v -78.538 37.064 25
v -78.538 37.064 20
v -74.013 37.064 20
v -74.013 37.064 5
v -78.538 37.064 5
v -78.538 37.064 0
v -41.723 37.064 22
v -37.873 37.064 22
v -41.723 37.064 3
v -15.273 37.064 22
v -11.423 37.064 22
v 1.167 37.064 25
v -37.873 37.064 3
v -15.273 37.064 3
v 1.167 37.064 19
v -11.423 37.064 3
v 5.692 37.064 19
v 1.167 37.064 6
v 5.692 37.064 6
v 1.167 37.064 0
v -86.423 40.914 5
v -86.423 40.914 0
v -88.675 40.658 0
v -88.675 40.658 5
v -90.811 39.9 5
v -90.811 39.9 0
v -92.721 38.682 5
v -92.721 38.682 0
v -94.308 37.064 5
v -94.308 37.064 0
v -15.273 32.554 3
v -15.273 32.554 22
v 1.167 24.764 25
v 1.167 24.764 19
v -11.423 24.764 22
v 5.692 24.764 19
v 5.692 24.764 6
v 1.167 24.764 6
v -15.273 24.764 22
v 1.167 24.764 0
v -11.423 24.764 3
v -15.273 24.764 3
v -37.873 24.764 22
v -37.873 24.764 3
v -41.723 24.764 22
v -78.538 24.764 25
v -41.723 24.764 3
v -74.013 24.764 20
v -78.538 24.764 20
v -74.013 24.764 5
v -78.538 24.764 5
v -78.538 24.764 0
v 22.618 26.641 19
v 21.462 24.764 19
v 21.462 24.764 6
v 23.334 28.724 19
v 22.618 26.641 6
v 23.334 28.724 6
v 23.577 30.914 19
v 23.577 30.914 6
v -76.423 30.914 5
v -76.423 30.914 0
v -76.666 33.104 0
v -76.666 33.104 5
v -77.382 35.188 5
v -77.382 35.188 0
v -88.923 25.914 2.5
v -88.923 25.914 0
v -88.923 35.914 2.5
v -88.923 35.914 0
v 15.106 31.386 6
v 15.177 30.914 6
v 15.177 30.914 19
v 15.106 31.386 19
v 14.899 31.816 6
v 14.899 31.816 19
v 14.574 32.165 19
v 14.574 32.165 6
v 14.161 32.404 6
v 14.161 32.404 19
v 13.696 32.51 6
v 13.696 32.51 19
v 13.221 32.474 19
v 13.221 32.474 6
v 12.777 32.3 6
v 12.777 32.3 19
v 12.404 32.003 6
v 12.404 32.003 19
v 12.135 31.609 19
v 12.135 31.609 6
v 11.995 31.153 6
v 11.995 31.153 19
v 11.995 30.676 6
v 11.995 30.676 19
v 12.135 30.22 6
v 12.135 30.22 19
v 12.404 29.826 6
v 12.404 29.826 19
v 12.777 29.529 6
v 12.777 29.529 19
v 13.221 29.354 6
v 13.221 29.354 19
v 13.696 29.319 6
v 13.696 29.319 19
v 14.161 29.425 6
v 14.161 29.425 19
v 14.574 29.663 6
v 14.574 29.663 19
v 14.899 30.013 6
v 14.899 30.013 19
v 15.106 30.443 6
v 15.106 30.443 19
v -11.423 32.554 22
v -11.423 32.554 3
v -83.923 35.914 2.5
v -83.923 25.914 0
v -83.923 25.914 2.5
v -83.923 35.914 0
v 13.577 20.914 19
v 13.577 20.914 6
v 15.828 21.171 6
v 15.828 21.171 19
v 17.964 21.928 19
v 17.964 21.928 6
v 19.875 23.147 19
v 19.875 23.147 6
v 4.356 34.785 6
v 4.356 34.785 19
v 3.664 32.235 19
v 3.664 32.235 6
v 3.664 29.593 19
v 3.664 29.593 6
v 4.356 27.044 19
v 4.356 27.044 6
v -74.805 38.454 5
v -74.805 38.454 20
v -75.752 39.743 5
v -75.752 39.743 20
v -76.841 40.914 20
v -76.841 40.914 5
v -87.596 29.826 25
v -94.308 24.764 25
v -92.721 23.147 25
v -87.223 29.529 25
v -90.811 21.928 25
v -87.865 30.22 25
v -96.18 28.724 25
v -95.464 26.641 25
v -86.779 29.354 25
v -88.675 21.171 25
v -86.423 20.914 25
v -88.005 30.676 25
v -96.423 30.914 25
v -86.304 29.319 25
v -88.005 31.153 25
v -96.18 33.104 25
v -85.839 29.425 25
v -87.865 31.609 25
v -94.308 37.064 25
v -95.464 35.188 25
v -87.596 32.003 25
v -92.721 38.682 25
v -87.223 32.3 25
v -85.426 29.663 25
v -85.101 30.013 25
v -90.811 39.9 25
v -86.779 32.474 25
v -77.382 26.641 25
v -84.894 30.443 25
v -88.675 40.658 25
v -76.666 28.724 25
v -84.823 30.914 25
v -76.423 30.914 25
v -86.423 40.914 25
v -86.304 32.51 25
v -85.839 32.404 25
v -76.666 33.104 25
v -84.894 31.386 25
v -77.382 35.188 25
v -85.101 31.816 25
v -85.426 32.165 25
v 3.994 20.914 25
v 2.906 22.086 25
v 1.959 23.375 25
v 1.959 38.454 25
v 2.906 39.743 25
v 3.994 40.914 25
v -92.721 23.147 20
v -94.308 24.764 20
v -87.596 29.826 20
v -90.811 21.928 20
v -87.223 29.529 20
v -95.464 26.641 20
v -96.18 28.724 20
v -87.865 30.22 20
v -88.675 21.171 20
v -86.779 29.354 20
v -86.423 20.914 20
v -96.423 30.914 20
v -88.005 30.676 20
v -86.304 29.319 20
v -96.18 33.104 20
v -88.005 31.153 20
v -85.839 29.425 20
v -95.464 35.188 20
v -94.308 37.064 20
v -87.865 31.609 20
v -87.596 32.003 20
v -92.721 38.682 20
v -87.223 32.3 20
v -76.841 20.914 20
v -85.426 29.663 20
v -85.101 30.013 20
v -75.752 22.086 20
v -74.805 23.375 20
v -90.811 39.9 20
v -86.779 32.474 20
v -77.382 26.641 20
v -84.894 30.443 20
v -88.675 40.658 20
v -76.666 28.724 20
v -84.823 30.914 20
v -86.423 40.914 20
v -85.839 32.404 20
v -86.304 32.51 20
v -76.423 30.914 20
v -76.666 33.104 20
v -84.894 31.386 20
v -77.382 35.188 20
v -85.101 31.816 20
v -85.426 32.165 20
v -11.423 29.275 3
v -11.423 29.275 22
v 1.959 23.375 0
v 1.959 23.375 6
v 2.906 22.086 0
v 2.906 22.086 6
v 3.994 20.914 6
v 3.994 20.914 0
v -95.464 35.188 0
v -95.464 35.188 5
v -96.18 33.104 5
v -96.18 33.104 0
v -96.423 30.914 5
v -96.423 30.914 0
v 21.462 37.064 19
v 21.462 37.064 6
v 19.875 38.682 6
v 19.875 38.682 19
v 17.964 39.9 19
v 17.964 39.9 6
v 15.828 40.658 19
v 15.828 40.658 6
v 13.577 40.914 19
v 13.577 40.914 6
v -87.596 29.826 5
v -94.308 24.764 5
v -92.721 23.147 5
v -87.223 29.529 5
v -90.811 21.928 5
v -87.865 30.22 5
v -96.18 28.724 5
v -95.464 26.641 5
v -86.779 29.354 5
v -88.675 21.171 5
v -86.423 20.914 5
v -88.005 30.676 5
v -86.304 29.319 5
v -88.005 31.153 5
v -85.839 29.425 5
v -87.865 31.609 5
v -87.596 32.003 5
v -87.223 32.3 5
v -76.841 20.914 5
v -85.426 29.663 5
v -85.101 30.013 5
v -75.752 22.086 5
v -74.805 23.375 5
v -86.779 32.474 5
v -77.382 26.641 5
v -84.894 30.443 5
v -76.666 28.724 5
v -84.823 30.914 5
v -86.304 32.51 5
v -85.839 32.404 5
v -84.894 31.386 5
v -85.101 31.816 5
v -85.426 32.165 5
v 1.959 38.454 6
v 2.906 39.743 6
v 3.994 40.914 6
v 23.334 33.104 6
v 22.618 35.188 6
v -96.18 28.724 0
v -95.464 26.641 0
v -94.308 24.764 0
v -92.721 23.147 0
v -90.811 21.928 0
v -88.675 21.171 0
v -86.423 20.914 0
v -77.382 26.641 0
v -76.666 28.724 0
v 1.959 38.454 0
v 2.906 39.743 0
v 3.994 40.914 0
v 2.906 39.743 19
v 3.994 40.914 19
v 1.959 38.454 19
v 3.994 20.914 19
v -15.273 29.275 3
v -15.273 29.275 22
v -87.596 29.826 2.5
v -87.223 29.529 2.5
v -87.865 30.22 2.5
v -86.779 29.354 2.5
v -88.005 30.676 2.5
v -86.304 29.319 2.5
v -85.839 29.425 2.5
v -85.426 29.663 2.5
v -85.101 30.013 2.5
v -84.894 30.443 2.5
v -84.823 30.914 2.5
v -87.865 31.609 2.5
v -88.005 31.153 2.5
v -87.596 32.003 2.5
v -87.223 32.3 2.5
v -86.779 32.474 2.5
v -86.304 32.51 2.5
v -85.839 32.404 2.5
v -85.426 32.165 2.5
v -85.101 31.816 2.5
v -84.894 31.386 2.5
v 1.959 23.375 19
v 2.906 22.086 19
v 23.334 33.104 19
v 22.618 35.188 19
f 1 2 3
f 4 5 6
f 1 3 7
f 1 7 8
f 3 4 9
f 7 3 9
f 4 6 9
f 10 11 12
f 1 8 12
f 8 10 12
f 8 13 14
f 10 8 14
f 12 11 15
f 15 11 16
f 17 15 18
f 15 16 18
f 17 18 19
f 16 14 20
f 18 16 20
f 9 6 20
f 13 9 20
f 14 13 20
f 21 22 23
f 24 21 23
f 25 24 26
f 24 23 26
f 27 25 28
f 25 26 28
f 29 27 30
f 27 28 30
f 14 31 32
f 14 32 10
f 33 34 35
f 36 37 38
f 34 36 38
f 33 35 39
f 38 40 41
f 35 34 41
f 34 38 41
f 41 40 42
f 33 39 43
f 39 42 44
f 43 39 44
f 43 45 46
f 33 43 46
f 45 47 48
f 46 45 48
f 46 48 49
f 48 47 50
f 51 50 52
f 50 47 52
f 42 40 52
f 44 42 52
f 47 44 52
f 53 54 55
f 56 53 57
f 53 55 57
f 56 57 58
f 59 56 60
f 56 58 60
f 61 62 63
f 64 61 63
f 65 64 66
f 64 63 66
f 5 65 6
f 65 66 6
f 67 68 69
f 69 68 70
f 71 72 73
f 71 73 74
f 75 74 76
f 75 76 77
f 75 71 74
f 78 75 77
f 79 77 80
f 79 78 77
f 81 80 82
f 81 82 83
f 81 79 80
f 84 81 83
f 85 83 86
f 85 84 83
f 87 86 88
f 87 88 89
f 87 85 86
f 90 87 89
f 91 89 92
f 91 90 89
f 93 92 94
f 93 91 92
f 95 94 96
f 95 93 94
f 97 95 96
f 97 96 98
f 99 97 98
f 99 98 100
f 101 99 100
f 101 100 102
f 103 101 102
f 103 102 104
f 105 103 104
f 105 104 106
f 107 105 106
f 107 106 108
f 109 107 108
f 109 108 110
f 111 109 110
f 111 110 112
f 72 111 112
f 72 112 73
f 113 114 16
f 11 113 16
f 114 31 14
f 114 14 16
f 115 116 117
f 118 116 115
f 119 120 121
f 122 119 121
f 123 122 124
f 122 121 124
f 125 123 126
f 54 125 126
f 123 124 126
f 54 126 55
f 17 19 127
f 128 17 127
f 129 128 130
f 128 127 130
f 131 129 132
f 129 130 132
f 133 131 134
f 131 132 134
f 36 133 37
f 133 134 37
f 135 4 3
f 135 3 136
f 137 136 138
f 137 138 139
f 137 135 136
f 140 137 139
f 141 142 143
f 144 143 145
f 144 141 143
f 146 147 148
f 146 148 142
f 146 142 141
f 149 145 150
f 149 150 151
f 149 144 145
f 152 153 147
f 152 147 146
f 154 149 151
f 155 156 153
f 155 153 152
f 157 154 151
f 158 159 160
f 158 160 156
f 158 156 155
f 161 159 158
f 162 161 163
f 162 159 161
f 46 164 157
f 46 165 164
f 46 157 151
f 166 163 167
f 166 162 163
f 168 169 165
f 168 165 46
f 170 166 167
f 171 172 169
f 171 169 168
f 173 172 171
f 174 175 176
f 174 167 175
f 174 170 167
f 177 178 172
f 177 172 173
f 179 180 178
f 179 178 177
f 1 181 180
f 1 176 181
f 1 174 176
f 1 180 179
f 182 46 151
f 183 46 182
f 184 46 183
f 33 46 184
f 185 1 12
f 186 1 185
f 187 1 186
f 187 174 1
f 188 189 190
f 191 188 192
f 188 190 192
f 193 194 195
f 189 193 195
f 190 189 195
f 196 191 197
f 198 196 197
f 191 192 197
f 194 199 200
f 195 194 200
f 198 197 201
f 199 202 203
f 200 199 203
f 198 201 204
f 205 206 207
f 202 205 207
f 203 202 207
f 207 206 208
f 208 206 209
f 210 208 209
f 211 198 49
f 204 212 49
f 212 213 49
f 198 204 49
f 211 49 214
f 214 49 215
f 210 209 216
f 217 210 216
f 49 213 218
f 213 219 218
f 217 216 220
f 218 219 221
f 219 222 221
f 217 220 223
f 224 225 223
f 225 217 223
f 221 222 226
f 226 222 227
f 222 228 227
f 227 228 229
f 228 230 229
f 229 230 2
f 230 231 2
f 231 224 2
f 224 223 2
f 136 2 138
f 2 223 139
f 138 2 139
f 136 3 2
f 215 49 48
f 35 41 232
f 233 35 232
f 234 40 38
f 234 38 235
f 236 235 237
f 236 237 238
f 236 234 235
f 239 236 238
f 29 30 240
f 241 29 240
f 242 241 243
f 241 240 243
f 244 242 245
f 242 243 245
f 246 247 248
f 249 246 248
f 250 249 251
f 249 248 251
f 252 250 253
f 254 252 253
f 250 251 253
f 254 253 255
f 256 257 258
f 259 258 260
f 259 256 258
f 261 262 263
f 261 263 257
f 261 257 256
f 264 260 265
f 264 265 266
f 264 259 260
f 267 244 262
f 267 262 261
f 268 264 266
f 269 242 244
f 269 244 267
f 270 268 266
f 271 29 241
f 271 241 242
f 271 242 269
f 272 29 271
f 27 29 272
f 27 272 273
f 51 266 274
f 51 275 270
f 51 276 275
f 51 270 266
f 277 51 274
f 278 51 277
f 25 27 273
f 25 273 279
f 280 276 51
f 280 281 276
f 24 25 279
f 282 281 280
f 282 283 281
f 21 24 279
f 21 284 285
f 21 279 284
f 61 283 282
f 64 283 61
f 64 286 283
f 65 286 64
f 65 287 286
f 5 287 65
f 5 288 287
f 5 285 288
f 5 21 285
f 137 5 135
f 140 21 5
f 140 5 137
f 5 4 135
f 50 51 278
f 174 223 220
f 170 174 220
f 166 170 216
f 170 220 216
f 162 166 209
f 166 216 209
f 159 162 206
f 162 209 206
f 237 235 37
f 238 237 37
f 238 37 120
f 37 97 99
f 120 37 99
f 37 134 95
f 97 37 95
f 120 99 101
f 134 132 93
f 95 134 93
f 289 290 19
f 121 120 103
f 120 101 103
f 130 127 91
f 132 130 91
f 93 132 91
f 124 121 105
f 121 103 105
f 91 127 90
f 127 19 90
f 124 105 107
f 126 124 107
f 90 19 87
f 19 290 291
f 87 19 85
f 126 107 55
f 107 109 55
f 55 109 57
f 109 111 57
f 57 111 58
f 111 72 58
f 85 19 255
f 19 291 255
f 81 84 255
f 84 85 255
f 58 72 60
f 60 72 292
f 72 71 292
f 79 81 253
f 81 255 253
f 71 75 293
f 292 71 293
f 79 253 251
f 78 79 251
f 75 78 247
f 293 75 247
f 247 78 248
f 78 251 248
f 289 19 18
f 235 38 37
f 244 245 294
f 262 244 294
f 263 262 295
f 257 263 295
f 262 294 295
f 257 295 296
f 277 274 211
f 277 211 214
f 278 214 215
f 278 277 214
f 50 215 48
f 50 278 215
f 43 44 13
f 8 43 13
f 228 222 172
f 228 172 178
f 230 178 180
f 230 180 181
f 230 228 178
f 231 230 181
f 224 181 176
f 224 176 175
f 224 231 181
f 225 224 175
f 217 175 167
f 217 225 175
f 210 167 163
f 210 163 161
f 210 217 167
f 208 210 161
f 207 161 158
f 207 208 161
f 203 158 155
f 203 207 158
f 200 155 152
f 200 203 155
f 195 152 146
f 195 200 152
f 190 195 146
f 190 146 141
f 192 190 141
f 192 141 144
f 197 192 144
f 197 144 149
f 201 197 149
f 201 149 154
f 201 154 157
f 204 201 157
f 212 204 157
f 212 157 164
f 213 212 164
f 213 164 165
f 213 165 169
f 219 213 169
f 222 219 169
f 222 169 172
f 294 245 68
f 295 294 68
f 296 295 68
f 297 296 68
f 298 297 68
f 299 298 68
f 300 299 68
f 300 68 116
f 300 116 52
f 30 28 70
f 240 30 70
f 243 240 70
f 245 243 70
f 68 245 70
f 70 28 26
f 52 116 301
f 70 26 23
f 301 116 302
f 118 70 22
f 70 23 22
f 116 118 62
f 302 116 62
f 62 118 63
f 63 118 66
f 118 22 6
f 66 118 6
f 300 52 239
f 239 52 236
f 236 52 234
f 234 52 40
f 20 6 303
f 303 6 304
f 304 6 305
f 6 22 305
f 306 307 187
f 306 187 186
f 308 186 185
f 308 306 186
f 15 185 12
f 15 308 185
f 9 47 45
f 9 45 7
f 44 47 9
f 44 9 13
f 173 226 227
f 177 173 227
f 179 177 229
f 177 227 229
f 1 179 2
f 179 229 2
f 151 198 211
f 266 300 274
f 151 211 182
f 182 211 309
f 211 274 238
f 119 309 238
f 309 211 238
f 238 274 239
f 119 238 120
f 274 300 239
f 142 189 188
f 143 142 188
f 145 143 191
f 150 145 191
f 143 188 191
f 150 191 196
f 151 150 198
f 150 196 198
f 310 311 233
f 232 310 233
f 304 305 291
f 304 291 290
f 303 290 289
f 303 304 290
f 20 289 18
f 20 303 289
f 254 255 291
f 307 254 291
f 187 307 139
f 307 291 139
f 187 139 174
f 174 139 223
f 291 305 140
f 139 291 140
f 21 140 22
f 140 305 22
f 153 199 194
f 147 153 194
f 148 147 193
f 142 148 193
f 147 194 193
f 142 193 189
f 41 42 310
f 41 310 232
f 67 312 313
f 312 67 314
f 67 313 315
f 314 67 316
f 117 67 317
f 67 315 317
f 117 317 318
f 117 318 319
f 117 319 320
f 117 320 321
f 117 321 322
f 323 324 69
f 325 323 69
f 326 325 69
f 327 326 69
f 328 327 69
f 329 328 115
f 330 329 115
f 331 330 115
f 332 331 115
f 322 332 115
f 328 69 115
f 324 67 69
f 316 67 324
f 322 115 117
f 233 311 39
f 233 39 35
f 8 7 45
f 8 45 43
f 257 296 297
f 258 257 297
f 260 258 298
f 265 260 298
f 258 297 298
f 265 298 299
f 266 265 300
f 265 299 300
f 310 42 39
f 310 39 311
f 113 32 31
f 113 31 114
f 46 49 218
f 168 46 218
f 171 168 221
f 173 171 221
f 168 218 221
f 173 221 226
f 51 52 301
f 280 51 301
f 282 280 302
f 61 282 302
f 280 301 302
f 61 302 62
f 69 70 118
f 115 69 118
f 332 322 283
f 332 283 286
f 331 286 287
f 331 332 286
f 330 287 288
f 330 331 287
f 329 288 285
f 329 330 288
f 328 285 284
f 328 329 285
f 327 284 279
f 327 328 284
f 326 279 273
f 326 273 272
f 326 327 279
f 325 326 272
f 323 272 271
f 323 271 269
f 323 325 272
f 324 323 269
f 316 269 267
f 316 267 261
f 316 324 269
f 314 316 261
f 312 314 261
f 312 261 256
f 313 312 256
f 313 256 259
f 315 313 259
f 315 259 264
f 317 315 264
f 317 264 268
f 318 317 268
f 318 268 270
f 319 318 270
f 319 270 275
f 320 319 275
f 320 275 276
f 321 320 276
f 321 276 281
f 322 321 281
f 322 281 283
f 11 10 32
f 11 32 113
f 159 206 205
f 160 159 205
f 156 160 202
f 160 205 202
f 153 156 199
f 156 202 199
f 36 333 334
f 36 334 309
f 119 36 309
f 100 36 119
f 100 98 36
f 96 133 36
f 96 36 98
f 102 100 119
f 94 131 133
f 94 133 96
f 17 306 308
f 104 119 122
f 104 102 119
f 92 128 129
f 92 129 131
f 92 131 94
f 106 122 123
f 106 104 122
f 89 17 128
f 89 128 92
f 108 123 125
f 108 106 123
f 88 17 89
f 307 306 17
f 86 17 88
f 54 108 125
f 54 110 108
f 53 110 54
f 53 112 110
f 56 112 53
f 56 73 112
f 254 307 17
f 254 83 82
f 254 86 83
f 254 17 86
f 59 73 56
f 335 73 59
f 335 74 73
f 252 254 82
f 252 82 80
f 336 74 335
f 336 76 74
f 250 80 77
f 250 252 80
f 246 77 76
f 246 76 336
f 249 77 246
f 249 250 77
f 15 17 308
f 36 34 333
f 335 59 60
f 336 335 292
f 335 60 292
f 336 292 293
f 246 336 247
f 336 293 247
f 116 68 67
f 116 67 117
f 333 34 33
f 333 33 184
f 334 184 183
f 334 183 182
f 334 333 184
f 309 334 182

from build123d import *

# Parameters (mm, degrees)
F0_R      = 1.6
F0_W      = 3.85
F0_H      = 12.3
F1_DEPTH  = 25
F2_W      = 3.85
F2_H      = 12.3
F3_DEPTH  = 3
F4_W      = 3.85
F4_H      = 12.3
F5_DEPTH  = 3
F7_START  = 19
F7_DEPTH  = 6
F8_DEPTH  = 6
F9_START  = 5
F9_DEPTH  = 15
F10_W     = 5
F10_H     = 10
F11_DEPTH = 2.5
F13_W     = 6.0873482585
F13_H     = 3.2788594067
F14_DEPTH = 25


with BuildPart() as f1:
    # F0 (on Top) → F1 (new body)
    with BuildSketch(Plane.XY):
        with BuildLine():
            Line((3.9944505033, 40.91431804), (-76.8407379923, 40.91431804))
            ThreePointArc((-76.8407379923, 40.91431804), (-75.2598774633, 39.1121217664), (-74.0134700985, 37.06431804))
            Line((-74.0134700985, 37.06431804), (-41.7231437445, 37.06431804))
            Line((-41.7231437445, 37.06431804), (-37.8731437445, 37.06431804))
            Line((-37.8731437445, 37.06431804), (-15.2731437445, 37.06431804))
            Line((-15.2731437445, 37.06431804), (-11.4231437445, 37.06431804))
            Line((-11.4231437445, 37.06431804), (1.1671826095, 37.06431804))
            ThreePointArc((1.1671826095, 37.06431804), (2.4135899744, 39.1121217664), (3.9944505033, 40.91431804))
        make_face()
        with BuildLine():
            Line((-76.8407379923, 40.91431804), (-86.4231437445, 40.91431804))
            ThreePointArc((-86.4231437445, 40.91431804), (-82.0356615508, 39.9004184178), (-78.5378726648, 37.06431804))
            Line((-78.5378726648, 37.06431804), (-74.0134700985, 37.06431804))
            ThreePointArc((-74.0134700985, 37.06431804), (-75.2598774633, 39.1121217664), (-76.8407379923, 40.91431804))
        make_face()
        with BuildLine():
            ThreePointArc((-78.5378726648, 37.06431804), (-82.0356615508, 39.9004184178), (-86.4231437445, 40.91431804))
            ThreePointArc((-86.4231437445, 40.91431804), (-90.8106259382, 39.9004184178), (-94.3084148241, 37.06431804))
            Line((-94.3084148241, 37.06431804), (-78.5378726648, 37.06431804))
        make_face()
        with BuildLine():
            ThreePointArc((-76.4231437445, 30.91431804), (-76.9665928194, 34.1660321421), (-78.5378726648, 37.06431804))
            Line((-78.5378726648, 37.06431804), (-94.3084148241, 37.06431804))
            ThreePointArc((-94.3084148241, 37.06431804), (-95.8796946695, 34.1660321421), (-96.4231437445, 30.91431804))
            ThreePointArc((-96.4231437445, 30.91431804), (-95.8796946695, 27.6626039379), (-94.3084148241, 24.76431804))
            Line((-94.3084148241, 24.76431804), (-78.5378726648, 24.76431804))
            ThreePointArc((-78.5378726648, 24.76431804), (-76.9665928194, 27.6626039379), (-76.4231437445, 30.91431804))
        make_face()
        with Locations((-86.4231437445, 30.91431804)):
            Circle(F0_R, mode=Mode.SUBTRACT)
        with BuildLine():
            ThreePointArc((-78.5378726648, 24.76431804), (-82.0356615508, 21.9282176622), (-86.4231437445, 20.91431804))
            Line((-86.4231437445, 20.91431804), (-76.8407379923, 20.91431804))
            ThreePointArc((-76.8407379923, 20.91431804), (-75.2598774633, 22.7165143137), (-74.0134700985, 24.76431804))
            Line((-74.0134700985, 24.76431804), (-78.5378726648, 24.76431804))
        make_face()
        with BuildLine():
            Line((-78.5378726648, 24.76431804), (-94.3084148241, 24.76431804))
            ThreePointArc((-94.3084148241, 24.76431804), (-90.8106259382, 21.9282176622), (-86.4231437445, 20.91431804))
            ThreePointArc((-86.4231437445, 20.91431804), (-82.0356615508, 21.9282176622), (-78.5378726648, 24.76431804))
        make_face()
        with BuildLine():
            ThreePointArc((-74.0134700985, 24.76431804), (-75.2598774633, 22.7165143137), (-76.8407379923, 20.91431804))
            Line((-76.8407379923, 20.91431804), (3.9944505033, 20.91431804))
            ThreePointArc((3.9944505033, 20.91431804), (2.4135899744, 22.7165143137), (1.1671826095, 24.76431804))
            Line((1.1671826095, 24.76431804), (-11.4231437445, 24.76431804))
            Line((-11.4231437445, 24.76431804), (-15.2731437445, 24.76431804))
            Line((-15.2731437445, 24.76431804), (-37.8731437445, 24.76431804))
            Line((-37.8731437445, 24.76431804), (-41.7231437445, 24.76431804))
            Line((-41.7231437445, 24.76431804), (-74.0134700985, 24.76431804))
        make_face()
        with Locations((-39.7981437445, 30.91431804)):
            Rectangle(F0_W, F0_H)
        with Locations((-13.3481437445, 30.91431804)):
            Rectangle(F0_W, F0_H)
        with BuildLine():
            ThreePointArc((23.5768562555, 30.91431804), (23.0334071806, 34.1660321421), (21.4621273352, 37.06431804))
            Line((21.4621273352, 37.06431804), (5.6915851759, 37.06431804))
            ThreePointArc((5.6915851759, 37.06431804), (3.5768562555, 30.91431804), (5.6915851759, 24.76431804))
            Line((5.6915851759, 24.76431804), (21.4621273352, 24.76431804))
            ThreePointArc((21.4621273352, 24.76431804), (23.0334071806, 27.6626039379), (23.5768562555, 30.91431804))
        make_face()
        with Locations((13.5768562555, 30.91431804)):
            Circle(F0_R, mode=Mode.SUBTRACT)
        with BuildLine():
            ThreePointArc((21.4621273352, 37.06431804), (17.9643384401, 39.9004184223), (13.5768562351, 40.91431804))
            ThreePointArc((13.5768562351, 40.91431804), (9.1893740527, 39.9004184133), (5.6915851759, 37.06431804))
            Line((5.6915851759, 37.06431804), (21.4621273352, 37.06431804))
        make_face()
        with BuildLine():
            Line((13.5768562351, 40.91431804), (3.9944505033, 40.91431804))
            ThreePointArc((3.9944505033, 40.91431804), (2.4135899744, 39.1121217664), (1.1671826095, 37.06431804))
            Line((1.1671826095, 37.06431804), (5.6915851759, 37.06431804))
            ThreePointArc((5.6915851759, 37.06431804), (9.1893740527, 39.9004184133), (13.5768562351, 40.91431804))
        make_face()
        with BuildLine():
            Line((21.4621273352, 24.76431804), (5.6915851759, 24.76431804))
            ThreePointArc((5.6915851759, 24.76431804), (9.1893740469, 21.9282176695), (13.5768562222, 20.91431804))
            ThreePointArc((13.5768562222, 20.91431804), (17.9643384343, 21.9282176549), (21.4621273352, 24.76431804))
        make_face()
        with BuildLine():
            Line((5.6915851759, 24.76431804), (1.1671826095, 24.76431804))
            ThreePointArc((1.1671826095, 24.76431804), (2.4135899744, 22.7165143137), (3.9944505033, 20.91431804))
            Line((3.9944505033, 20.91431804), (13.5768562222, 20.91431804))
            ThreePointArc((13.5768562222, 20.91431804), (9.1893740469, 21.9282176695), (5.6915851759, 24.76431804))
        make_face()
    extrude(amount=F1_DEPTH)

    # F2 (on face) → F3 (cut)
    with BuildSketch(Plane.XY.offset(25)):
        with Locations((-39.7981437445, 30.91431804)):
            Rectangle(F2_W, F2_H)
        with Locations((-13.3481437445, 30.91431804)):
            Rectangle(F2_W, F2_H)
    extrude(amount=-F3_DEPTH, mode=Mode.SUBTRACT)

    # F4 (on face) → F5 (cut)
    with BuildSketch(Plane(origin=(0, 0, 0), x_dir=(1, 0, 0), z_dir=(0, 0, -1))):
        with Locations((-13.3481437445, -30.91431804)):
            Rectangle(F4_W, F4_H)
        with Locations((-39.7981437445, -30.91431804)):
            Rectangle(F4_W, F4_H)
    extrude(amount=-F5_DEPTH, mode=Mode.SUBTRACT)

    # F0 (on Top) → F7 (cut)
    with BuildSketch(Plane.XY.offset(F7_START)):
        with BuildLine():
            Line((21.4621273352, 24.76431804), (5.6915851759, 24.76431804))
            ThreePointArc((5.6915851759, 24.76431804), (9.1893740469, 21.9282176695), (13.5768562222, 20.91431804))
            ThreePointArc((13.5768562222, 20.91431804), (17.9643384343, 21.9282176549), (21.4621273352, 24.76431804))
        make_face()
        with BuildLine():
            ThreePointArc((23.5768562555, 30.91431804), (23.0334071806, 34.1660321421), (21.4621273352, 37.06431804))
            Line((21.4621273352, 37.06431804), (5.6915851759, 37.06431804))
            ThreePointArc((5.6915851759, 37.06431804), (3.5768562555, 30.91431804), (5.6915851759, 24.76431804))
            Line((5.6915851759, 24.76431804), (21.4621273352, 24.76431804))
            ThreePointArc((21.4621273352, 24.76431804), (23.0334071806, 27.6626039379), (23.5768562555, 30.91431804))
        make_face()
        with Locations((13.5768562555, 30.91431804)):
            Circle(F0_R, mode=Mode.SUBTRACT)
        with BuildLine():
            ThreePointArc((21.4621273352, 37.06431804), (17.9643384401, 39.9004184223), (13.5768562351, 40.91431804))
            ThreePointArc((13.5768562351, 40.91431804), (9.1893740527, 39.9004184133), (5.6915851759, 37.06431804))
            Line((5.6915851759, 37.06431804), (21.4621273352, 37.06431804))
        make_face()
        with BuildLine():
            Line((13.5768562351, 40.91431804), (3.9944505033, 40.91431804))
            ThreePointArc((3.9944505033, 40.91431804), (2.4135899744, 39.1121217664), (1.1671826095, 37.06431804))
            Line((1.1671826095, 37.06431804), (5.6915851759, 37.06431804))
            ThreePointArc((5.6915851759, 37.06431804), (9.1893740527, 39.9004184133), (13.5768562351, 40.91431804))
        make_face()
        with BuildLine():
            Line((5.6915851759, 24.76431804), (1.1671826095, 24.76431804))
            ThreePointArc((1.1671826095, 24.76431804), (2.4135899744, 22.7165143137), (3.9944505033, 20.91431804))
            Line((3.9944505033, 20.91431804), (13.5768562222, 20.91431804))
            ThreePointArc((13.5768562222, 20.91431804), (9.1893740469, 21.9282176695), (5.6915851759, 24.76431804))
        make_face()
    extrude(amount=F7_DEPTH, mode=Mode.SUBTRACT)

    # F0 (on Top) → F8 (cut)
    with BuildSketch(Plane.XY):
        with BuildLine():
            ThreePointArc((23.5768562555, 30.91431804), (23.0334071806, 34.1660321421), (21.4621273352, 37.06431804))
            Line((21.4621273352, 37.06431804), (5.6915851759, 37.06431804))
            ThreePointArc((5.6915851759, 37.06431804), (3.5768562555, 30.91431804), (5.6915851759, 24.76431804))
            Line((5.6915851759, 24.76431804), (21.4621273352, 24.76431804))
            ThreePointArc((21.4621273352, 24.76431804), (23.0334071806, 27.6626039379), (23.5768562555, 30.91431804))
        make_face()
        with Locations((13.5768562555, 30.91431804)):
            Circle(F0_R, mode=Mode.SUBTRACT)
        with BuildLine():
            Line((13.5768562351, 40.91431804), (3.9944505033, 40.91431804))
            ThreePointArc((3.9944505033, 40.91431804), (2.4135899744, 39.1121217664), (1.1671826095, 37.06431804))
            Line((1.1671826095, 37.06431804), (5.6915851759, 37.06431804))
            ThreePointArc((5.6915851759, 37.06431804), (9.1893740527, 39.9004184133), (13.5768562351, 40.91431804))
        make_face()
        with BuildLine():
            Line((5.6915851759, 24.76431804), (1.1671826095, 24.76431804))
            ThreePointArc((1.1671826095, 24.76431804), (2.4135899744, 22.7165143137), (3.9944505033, 20.91431804))
            Line((3.9944505033, 20.91431804), (13.5768562222, 20.91431804))
            ThreePointArc((13.5768562222, 20.91431804), (9.1893740469, 21.9282176695), (5.6915851759, 24.76431804))
        make_face()
        with BuildLine():
            Line((21.4621273352, 24.76431804), (5.6915851759, 24.76431804))
            ThreePointArc((5.6915851759, 24.76431804), (9.1893740469, 21.9282176695), (13.5768562222, 20.91431804))
            ThreePointArc((13.5768562222, 20.91431804), (17.9643384343, 21.9282176549), (21.4621273352, 24.76431804))
        make_face()
        with BuildLine():
            ThreePointArc((21.4621273352, 37.06431804), (17.9643384401, 39.9004184223), (13.5768562351, 40.91431804))
            ThreePointArc((13.5768562351, 40.91431804), (9.1893740527, 39.9004184133), (5.6915851759, 37.06431804))
            Line((5.6915851759, 37.06431804), (21.4621273352, 37.06431804))
        make_face()
    extrude(amount=F8_DEPTH, mode=Mode.SUBTRACT)

    # F0 (on Top) → F9 (cut)
    with BuildSketch(Plane.XY.offset(F9_START)):
        with BuildLine():
            ThreePointArc((-76.4231437445, 30.91431804), (-76.9665928194, 34.1660321421), (-78.5378726648, 37.06431804))
            Line((-78.5378726648, 37.06431804), (-94.3084148241, 37.06431804))
            ThreePointArc((-94.3084148241, 37.06431804), (-95.8796946695, 34.1660321421), (-96.4231437445, 30.91431804))
            ThreePointArc((-96.4231437445, 30.91431804), (-95.8796946695, 27.6626039379), (-94.3084148241, 24.76431804))
            Line((-94.3084148241, 24.76431804), (-78.5378726648, 24.76431804))
            ThreePointArc((-78.5378726648, 24.76431804), (-76.9665928194, 27.6626039379), (-76.4231437445, 30.91431804))
        make_face()
        with Locations((-86.4231437445, 30.91431804)):
            Circle(F0_R, mode=Mode.SUBTRACT)
        with BuildLine():
            Line((-78.5378726648, 24.76431804), (-94.3084148241, 24.76431804))
            ThreePointArc((-94.3084148241, 24.76431804), (-90.8106259382, 21.9282176622), (-86.4231437445, 20.91431804))
            ThreePointArc((-86.4231437445, 20.91431804), (-82.0356615508, 21.9282176622), (-78.5378726648, 24.76431804))
        make_face()
        with BuildLine():
            ThreePointArc((-78.5378726648, 37.06431804), (-82.0356615508, 39.9004184178), (-86.4231437445, 40.91431804))
            ThreePointArc((-86.4231437445, 40.91431804), (-90.8106259382, 39.9004184178), (-94.3084148241, 37.06431804))
            Line((-94.3084148241, 37.06431804), (-78.5378726648, 37.06431804))
        make_face()
        with BuildLine():
            Line((-76.8407379923, 40.91431804), (-86.4231437445, 40.91431804))
            ThreePointArc((-86.4231437445, 40.91431804), (-82.0356615508, 39.9004184178), (-78.5378726648, 37.06431804))
            Line((-78.5378726648, 37.06431804), (-74.0134700985, 37.06431804))
            ThreePointArc((-74.0134700985, 37.06431804), (-75.2598774633, 39.1121217664), (-76.8407379923, 40.91431804))
        make_face()
        with BuildLine():
            ThreePointArc((-78.5378726648, 24.76431804), (-82.0356615508, 21.9282176622), (-86.4231437445, 20.91431804))
            Line((-86.4231437445, 20.91431804), (-76.8407379923, 20.91431804))
            ThreePointArc((-76.8407379923, 20.91431804), (-75.2598774633, 22.7165143137), (-74.0134700985, 24.76431804))
            Line((-74.0134700985, 24.76431804), (-78.5378726648, 24.76431804))
        make_face()
    extrude(amount=F9_DEPTH, mode=Mode.SUBTRACT)

    # F10 (on face) → F11 (cut)
    with BuildSketch(Plane.XY):
        with Locations((-86.4231437445, 30.91431804)):
            Rectangle(F10_W, F10_H)
    extrude(amount=F11_DEPTH, mode=Mode.SUBTRACT)

    # F13 (on face) → F14 (cut)
    with BuildSketch(Plane.XY.offset(22)):
        with Locations((-13.3481437445, 30.91431804)):
            Rectangle(F13_W, F13_H)
    extrude(amount=-F14_DEPTH, mode=Mode.SUBTRACT)


solid = f1.part
